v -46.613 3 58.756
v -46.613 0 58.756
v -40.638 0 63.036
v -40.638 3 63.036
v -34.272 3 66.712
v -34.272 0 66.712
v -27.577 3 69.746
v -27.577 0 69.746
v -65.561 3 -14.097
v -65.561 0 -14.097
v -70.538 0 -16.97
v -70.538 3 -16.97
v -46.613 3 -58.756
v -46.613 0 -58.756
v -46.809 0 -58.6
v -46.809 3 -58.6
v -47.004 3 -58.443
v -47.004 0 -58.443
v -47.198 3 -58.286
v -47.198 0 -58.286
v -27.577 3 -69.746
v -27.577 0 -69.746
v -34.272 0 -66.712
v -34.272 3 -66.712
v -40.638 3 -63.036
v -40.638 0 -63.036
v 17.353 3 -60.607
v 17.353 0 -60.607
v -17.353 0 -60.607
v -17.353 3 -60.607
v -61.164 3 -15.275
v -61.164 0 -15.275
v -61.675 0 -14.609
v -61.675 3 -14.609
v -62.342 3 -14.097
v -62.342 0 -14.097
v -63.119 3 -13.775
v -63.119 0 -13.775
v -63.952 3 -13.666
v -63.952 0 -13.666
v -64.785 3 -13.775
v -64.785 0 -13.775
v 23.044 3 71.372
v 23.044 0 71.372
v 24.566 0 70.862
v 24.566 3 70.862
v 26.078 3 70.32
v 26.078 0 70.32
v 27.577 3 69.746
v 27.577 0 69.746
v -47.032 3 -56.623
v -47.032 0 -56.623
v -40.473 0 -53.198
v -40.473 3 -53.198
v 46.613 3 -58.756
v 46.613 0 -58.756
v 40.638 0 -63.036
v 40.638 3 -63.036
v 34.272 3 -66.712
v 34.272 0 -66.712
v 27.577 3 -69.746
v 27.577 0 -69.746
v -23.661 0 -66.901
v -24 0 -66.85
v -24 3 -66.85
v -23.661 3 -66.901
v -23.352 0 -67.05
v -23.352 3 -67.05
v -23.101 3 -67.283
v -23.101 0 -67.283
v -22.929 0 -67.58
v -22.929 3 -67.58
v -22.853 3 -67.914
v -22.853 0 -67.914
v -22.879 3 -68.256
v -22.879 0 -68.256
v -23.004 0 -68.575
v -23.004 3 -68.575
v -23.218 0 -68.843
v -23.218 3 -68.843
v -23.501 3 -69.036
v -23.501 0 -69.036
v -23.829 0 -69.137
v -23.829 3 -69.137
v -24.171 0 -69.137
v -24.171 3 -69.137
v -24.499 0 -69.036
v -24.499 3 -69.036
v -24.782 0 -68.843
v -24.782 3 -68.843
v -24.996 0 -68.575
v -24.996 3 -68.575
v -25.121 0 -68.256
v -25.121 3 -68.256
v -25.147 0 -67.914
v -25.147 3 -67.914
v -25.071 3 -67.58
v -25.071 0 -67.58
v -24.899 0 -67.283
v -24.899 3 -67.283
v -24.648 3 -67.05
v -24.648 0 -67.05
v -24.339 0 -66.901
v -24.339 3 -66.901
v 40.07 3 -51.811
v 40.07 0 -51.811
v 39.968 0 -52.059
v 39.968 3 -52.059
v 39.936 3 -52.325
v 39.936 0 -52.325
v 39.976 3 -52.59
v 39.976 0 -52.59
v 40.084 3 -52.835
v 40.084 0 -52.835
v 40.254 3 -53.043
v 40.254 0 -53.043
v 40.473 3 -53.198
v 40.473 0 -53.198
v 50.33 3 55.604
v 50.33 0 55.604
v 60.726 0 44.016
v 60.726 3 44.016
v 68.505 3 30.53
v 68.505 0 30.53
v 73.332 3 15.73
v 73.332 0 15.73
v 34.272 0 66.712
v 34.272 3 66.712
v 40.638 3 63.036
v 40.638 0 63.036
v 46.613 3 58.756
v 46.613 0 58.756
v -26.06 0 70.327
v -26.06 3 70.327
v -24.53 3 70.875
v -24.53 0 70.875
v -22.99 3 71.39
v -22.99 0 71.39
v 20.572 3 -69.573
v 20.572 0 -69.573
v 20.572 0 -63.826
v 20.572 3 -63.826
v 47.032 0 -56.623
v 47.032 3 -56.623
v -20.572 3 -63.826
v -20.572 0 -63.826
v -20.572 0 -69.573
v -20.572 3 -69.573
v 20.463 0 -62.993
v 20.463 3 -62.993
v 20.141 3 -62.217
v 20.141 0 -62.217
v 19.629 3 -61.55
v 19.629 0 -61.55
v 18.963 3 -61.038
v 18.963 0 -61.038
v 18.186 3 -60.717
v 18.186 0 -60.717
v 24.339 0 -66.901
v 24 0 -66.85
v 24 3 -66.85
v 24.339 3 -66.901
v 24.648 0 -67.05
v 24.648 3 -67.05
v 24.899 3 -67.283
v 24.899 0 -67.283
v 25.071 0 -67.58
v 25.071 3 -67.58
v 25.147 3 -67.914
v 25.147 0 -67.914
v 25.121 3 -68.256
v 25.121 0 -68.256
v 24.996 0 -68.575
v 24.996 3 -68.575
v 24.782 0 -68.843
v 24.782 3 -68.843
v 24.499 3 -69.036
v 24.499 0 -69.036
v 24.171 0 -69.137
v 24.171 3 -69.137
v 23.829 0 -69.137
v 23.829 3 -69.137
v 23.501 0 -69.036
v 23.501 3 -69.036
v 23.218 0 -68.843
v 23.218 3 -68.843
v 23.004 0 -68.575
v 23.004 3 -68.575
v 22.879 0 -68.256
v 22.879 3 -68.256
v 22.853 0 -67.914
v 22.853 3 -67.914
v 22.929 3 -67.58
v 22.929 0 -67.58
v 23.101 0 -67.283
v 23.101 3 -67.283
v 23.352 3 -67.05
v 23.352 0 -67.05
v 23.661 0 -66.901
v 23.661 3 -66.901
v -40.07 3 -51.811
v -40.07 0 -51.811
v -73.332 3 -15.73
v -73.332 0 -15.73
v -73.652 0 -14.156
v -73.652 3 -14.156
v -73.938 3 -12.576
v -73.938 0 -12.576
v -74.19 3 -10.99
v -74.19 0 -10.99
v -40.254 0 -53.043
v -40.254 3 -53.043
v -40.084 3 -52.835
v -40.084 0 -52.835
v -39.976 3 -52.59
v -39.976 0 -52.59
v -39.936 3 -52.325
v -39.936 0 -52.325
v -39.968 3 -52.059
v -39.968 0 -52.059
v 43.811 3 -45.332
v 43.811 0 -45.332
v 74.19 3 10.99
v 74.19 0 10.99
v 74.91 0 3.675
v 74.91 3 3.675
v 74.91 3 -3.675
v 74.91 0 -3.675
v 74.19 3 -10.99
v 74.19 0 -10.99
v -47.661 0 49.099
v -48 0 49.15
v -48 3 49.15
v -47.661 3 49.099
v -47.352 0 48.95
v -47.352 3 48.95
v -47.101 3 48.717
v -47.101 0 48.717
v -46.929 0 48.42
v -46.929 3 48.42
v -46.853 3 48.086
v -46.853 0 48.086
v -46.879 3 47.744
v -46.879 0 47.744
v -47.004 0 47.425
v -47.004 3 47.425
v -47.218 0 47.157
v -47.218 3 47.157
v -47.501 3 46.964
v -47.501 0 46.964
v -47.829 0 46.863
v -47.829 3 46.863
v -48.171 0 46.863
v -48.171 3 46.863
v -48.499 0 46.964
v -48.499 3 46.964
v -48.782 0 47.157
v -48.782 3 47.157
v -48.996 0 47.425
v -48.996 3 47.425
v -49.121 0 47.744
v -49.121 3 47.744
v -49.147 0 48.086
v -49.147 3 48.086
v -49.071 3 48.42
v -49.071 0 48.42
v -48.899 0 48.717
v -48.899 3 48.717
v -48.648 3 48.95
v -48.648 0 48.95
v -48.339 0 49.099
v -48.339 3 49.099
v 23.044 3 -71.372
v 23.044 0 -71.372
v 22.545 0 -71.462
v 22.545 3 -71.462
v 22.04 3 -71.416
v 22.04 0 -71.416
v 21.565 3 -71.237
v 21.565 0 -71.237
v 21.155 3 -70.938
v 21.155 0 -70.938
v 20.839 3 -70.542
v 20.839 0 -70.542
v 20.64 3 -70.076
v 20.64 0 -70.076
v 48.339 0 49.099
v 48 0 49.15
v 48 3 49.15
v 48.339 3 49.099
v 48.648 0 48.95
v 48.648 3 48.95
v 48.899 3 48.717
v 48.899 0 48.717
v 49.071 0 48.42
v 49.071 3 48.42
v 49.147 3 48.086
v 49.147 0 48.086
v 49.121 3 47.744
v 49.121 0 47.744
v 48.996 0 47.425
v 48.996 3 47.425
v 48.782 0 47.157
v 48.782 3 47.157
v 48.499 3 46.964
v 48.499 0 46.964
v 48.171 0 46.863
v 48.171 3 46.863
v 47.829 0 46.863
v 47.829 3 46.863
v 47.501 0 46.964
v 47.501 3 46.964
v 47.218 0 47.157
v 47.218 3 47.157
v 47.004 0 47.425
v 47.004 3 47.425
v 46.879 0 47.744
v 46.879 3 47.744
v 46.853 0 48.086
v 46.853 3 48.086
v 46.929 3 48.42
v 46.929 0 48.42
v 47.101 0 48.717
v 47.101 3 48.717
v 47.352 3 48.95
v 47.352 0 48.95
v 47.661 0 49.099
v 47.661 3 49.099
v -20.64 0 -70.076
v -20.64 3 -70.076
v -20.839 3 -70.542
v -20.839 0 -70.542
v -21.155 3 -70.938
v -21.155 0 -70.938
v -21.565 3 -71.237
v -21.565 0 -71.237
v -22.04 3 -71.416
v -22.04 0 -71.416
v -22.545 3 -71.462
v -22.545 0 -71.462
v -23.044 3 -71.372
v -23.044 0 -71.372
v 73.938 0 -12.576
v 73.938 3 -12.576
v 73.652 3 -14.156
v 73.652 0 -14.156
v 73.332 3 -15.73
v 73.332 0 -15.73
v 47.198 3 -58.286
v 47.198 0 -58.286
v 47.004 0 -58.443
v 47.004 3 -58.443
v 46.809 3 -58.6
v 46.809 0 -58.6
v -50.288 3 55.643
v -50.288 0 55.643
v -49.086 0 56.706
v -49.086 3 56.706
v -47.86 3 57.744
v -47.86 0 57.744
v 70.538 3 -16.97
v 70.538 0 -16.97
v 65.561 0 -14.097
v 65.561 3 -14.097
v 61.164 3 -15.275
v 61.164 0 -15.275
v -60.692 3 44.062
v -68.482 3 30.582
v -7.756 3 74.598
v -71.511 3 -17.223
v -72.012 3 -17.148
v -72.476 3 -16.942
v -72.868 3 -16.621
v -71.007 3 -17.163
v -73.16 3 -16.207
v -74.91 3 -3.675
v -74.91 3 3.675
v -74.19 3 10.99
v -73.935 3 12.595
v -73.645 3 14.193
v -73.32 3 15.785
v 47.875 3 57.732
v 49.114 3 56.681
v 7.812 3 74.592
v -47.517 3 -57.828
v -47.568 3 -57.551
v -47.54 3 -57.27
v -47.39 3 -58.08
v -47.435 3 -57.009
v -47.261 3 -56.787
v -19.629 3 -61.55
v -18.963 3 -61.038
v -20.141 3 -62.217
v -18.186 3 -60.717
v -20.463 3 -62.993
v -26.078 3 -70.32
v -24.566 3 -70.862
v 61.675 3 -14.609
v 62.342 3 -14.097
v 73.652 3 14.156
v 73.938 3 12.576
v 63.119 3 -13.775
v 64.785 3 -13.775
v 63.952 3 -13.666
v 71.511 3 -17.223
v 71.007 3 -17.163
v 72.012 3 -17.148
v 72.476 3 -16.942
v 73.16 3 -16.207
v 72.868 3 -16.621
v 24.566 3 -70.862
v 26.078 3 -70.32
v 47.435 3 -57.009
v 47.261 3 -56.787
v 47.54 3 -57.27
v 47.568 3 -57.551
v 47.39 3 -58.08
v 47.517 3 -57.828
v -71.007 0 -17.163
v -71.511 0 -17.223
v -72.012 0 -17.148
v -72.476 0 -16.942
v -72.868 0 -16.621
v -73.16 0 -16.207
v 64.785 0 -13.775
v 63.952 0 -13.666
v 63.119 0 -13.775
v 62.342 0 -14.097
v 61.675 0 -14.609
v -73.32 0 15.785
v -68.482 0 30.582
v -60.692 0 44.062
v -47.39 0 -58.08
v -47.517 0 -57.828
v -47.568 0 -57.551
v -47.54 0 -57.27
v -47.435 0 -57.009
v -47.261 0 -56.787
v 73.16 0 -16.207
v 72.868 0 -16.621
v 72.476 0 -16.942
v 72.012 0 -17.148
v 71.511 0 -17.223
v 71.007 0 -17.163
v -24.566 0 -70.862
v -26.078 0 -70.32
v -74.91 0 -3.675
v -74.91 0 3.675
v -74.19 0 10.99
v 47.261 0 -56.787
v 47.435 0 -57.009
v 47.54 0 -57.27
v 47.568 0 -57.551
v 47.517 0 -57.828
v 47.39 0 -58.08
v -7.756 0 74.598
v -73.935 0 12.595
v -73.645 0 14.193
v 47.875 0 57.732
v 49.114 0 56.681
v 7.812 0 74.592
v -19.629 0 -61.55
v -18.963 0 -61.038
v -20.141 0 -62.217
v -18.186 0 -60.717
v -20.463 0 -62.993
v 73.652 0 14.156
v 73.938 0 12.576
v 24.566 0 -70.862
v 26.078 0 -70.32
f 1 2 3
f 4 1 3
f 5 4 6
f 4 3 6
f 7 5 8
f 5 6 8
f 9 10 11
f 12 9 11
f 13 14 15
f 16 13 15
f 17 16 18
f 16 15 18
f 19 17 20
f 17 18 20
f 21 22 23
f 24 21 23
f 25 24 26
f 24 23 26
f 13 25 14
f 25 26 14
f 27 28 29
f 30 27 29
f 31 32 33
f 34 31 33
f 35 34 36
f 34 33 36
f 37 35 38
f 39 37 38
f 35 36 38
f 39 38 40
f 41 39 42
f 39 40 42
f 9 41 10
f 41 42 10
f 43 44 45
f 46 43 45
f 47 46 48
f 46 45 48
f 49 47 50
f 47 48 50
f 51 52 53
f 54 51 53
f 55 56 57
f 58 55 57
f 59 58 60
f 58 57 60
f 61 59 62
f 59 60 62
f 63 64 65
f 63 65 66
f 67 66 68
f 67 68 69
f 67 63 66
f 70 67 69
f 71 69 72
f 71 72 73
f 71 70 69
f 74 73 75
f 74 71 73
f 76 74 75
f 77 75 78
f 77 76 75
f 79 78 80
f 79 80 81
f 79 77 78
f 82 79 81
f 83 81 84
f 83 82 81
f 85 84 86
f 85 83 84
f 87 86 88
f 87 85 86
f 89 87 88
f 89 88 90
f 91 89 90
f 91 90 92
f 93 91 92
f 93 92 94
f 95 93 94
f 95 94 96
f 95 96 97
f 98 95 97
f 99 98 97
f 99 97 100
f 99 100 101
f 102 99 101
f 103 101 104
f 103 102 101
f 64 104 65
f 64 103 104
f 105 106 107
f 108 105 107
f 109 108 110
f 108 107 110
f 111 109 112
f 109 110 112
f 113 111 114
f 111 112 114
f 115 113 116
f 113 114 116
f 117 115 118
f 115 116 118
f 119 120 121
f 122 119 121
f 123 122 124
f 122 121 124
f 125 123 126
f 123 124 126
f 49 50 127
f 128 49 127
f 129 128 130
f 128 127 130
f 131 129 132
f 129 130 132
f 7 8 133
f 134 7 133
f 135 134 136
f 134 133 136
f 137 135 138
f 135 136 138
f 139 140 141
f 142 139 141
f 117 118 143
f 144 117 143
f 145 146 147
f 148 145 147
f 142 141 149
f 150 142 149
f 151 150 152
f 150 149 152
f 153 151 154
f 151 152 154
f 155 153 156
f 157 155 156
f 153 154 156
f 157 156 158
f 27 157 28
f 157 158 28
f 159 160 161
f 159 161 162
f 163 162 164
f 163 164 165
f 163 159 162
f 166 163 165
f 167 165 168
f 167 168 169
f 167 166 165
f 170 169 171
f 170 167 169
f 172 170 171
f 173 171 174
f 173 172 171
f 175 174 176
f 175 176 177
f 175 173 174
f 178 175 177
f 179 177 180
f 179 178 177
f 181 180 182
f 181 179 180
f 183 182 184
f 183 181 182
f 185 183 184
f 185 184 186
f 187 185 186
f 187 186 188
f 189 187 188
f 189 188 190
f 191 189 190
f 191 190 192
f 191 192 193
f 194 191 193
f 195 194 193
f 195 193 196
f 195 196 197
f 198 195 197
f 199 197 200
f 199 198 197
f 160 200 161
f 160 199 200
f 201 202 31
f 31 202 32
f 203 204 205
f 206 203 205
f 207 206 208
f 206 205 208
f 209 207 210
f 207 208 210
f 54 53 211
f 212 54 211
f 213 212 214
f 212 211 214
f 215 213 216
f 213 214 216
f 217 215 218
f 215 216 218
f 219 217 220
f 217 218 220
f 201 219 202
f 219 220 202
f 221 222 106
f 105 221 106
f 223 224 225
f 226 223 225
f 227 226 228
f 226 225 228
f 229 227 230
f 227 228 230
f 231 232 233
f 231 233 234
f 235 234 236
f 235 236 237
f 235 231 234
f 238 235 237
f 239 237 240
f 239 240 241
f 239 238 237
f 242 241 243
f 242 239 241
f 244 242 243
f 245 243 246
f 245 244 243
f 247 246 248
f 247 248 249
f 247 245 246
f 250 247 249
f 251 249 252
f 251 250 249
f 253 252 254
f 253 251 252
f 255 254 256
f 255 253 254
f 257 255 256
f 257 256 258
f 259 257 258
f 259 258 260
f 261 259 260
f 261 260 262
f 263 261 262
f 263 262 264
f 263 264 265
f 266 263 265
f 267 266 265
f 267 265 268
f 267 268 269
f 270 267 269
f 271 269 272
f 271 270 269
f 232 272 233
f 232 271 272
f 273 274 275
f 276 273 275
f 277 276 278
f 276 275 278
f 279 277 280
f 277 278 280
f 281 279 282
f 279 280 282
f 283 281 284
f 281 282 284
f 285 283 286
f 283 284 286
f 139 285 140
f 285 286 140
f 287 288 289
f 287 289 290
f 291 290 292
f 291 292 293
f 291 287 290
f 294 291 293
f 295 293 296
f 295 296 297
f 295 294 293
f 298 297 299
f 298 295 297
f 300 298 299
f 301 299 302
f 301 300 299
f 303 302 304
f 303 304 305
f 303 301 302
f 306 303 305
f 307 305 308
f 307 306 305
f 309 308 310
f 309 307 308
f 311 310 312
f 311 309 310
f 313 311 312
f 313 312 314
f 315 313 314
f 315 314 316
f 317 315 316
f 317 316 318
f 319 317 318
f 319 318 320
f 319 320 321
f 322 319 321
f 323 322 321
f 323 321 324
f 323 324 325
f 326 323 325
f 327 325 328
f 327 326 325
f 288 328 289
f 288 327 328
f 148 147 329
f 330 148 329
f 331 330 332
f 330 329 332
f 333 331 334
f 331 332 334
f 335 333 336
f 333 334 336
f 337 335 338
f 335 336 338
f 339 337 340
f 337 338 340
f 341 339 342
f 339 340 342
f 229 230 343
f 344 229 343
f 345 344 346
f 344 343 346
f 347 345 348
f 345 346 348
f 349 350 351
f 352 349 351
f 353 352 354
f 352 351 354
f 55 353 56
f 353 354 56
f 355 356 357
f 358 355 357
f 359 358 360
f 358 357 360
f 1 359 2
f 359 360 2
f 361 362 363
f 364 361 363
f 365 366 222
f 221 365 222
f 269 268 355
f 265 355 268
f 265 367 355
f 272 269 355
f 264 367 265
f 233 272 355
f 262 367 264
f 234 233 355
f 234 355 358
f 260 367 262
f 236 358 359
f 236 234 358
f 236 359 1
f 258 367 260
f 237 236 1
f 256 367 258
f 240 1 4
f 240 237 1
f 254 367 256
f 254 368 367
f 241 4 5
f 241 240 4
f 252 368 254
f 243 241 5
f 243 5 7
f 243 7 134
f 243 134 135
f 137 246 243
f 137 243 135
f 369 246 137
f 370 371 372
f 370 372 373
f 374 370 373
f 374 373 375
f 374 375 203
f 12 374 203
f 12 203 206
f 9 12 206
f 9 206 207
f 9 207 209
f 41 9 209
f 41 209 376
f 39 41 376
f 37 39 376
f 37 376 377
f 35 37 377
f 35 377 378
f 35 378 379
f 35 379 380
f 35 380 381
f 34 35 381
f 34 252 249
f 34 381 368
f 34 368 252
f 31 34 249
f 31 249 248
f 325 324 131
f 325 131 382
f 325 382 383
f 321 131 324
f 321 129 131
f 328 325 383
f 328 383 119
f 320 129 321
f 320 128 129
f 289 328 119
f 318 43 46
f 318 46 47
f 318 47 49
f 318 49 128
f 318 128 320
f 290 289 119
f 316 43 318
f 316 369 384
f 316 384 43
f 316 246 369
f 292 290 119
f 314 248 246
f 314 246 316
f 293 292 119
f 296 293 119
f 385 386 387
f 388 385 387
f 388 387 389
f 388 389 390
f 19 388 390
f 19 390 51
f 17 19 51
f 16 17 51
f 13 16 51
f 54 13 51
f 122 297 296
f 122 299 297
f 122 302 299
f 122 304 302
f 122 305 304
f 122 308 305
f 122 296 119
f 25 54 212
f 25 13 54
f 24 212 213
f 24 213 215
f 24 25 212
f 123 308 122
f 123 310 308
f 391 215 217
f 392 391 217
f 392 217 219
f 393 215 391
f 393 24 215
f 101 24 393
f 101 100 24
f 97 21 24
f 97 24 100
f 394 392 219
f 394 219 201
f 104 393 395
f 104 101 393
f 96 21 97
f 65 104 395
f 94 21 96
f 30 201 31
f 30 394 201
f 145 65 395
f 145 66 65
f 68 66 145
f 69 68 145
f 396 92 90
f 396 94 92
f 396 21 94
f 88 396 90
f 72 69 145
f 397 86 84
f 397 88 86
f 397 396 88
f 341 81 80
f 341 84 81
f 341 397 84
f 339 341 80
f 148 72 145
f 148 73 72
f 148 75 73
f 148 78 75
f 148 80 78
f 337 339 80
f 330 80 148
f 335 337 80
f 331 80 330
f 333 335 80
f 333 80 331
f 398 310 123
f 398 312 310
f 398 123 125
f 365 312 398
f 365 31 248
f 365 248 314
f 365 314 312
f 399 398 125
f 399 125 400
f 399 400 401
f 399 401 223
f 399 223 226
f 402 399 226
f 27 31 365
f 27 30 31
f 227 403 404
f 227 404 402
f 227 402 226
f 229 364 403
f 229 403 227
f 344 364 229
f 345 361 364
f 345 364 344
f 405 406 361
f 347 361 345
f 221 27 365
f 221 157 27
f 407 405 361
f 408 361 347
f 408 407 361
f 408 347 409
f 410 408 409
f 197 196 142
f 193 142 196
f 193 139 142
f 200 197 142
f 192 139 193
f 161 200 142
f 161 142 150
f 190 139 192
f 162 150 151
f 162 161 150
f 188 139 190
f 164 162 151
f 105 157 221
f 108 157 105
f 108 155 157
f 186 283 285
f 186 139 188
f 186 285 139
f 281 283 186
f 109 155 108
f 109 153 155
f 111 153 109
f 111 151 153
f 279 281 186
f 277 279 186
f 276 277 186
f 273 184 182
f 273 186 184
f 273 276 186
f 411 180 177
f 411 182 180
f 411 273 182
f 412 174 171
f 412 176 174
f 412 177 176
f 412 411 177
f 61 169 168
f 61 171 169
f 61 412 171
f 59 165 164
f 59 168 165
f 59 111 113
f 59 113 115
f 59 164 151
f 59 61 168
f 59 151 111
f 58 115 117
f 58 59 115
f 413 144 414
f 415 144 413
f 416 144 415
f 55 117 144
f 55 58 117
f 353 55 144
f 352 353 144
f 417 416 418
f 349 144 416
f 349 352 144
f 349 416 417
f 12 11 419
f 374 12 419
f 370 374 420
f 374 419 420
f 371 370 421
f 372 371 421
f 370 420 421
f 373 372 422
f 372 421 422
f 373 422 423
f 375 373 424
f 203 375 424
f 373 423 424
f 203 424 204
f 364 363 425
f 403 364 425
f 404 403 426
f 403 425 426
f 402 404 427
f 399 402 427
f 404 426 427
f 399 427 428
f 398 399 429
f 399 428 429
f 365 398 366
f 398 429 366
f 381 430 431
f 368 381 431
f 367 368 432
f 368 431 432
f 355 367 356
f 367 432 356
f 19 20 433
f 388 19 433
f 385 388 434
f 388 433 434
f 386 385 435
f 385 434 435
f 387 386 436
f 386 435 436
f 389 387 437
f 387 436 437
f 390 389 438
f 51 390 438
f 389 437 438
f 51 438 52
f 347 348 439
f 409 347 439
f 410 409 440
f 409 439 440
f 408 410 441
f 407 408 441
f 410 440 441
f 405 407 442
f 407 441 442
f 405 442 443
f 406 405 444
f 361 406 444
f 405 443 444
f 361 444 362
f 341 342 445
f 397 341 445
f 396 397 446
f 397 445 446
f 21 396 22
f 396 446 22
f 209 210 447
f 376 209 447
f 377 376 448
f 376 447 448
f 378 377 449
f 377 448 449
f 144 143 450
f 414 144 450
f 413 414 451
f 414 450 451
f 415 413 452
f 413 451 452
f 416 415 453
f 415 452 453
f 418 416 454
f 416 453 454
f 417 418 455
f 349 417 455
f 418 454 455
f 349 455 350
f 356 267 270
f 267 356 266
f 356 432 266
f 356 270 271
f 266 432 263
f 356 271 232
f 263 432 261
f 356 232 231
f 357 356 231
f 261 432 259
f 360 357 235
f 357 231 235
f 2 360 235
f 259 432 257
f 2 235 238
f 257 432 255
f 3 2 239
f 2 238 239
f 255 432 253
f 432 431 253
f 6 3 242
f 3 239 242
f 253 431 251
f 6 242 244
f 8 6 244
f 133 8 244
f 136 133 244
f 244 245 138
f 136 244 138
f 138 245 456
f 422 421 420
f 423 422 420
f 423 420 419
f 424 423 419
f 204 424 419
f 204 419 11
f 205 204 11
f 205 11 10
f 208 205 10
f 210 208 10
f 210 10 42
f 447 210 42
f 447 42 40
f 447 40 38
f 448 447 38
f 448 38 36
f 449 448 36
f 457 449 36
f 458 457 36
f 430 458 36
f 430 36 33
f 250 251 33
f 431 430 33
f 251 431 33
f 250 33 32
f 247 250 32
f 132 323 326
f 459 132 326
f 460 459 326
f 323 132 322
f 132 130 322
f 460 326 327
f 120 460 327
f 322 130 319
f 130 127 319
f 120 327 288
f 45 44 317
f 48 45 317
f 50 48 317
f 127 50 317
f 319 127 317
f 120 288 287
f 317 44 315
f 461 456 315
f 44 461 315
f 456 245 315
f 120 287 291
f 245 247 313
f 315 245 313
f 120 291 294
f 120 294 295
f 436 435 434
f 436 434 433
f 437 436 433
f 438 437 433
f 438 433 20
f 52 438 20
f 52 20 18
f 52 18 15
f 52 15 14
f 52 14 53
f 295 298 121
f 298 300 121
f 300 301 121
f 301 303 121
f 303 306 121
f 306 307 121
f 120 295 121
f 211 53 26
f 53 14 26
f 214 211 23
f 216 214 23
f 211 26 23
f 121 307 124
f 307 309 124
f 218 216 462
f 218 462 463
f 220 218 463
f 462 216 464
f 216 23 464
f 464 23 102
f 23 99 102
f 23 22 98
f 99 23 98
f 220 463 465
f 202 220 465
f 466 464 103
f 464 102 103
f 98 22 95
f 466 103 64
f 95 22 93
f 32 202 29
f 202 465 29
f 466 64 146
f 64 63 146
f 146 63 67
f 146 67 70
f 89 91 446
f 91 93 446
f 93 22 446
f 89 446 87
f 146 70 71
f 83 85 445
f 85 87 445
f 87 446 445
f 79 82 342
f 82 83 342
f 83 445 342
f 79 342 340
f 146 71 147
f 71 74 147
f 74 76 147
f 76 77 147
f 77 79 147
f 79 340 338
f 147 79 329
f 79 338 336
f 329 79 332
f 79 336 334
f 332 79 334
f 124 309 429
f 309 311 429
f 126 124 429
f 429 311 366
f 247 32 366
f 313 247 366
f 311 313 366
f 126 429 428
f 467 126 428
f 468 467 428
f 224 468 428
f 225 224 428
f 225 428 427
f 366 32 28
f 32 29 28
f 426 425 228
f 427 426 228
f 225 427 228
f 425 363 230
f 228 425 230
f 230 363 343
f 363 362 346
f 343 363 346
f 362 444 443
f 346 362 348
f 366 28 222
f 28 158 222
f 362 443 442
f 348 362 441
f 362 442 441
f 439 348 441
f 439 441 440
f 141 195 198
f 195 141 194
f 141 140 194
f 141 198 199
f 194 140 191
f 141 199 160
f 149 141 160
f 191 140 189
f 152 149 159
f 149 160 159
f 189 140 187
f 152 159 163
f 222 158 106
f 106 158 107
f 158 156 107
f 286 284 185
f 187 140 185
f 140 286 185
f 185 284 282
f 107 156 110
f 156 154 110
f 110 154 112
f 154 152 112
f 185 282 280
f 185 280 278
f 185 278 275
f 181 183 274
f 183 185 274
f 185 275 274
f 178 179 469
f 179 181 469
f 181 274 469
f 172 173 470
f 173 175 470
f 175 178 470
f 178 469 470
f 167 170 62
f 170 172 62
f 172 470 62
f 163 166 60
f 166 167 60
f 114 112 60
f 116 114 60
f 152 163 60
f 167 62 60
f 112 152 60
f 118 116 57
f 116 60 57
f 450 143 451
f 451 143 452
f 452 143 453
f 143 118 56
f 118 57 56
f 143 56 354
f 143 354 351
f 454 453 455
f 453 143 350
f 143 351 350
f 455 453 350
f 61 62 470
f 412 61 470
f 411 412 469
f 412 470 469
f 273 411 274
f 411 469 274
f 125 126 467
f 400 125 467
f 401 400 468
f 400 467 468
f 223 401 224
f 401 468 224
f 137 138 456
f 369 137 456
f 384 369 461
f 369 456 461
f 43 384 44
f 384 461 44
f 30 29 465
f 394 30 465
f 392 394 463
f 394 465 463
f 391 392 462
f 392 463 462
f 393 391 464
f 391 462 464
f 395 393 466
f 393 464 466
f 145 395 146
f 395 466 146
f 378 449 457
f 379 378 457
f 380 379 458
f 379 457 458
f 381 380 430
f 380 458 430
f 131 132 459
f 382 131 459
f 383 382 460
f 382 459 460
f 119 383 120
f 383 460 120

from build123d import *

# Parameters (mm, degrees)
SKETCH1_R           = 1.15
BOSS_EXTRUDE2_DEPTH = 3


with BuildPart() as part:
    # Sketch1 → Boss-Extrude2 (new body)
    with BuildSketch(Plane(origin=(0, 0, 0), x_dir=(1, 0, 0), z_dir=(0, 1, 0))):
        with BuildLine():
            Line((17.353017405, 60.60705136), (-17.353017405, 60.60705136))
            ThreePointArc((-17.353017405, 60.60705136), (-19.629383429, 61.54995304), (-20.572285109, 63.826319064))
            Line((-20.572285109, 63.826319064), (-20.572285109, 69.573042322))
            ThreePointArc((-20.572285109, 69.573042322), (-21.350187318, 71.101515686), (-23.043737047, 71.372166724))
            ThreePointArc((-23.043737047, 71.372166724), (-25.323501925, 70.595469049), (-27.577152814, 69.745972233))
            ThreePointArc((-27.577152814, 69.745972233), (-37.5, 64.951905284), (-46.613207358, 58.755501017))
            ThreePointArc((-46.613207358, 58.755501017), (-46.906411899, 58.521692754), (-47.198443695, 58.286421342))
            ThreePointArc((-47.198443695, 58.286421342), (-47.564165172, 57.409734041), (-47.032034758, 56.622860452))
            Line((-47.032034758, 56.622860452), (-40.472942236, 53.197546407))
            ThreePointArc((-40.472942236, 53.197546407), (-39.975613978, 52.590341474), (-40.069820478, 51.811137802))
            Line((-40.069820478, 51.811137802), (-61.163754829, 15.275371775))
            ThreePointArc((-61.163754829, 15.275371775), (-63.118514649, 13.77543181), (-65.561356294, 14.097038013))
            Line((-65.561356294, 14.097038013), (-70.538164624, 16.970399642))
            ThreePointArc((-70.538164624, 16.970399642), (-72.250812491, 17.06095325), (-73.33197803, 15.729621681))
            ThreePointArc((-73.33197803, 15.729621681), (-73.799220551, 13.366938545), (-74.190360172, 10.990471215))
            ThreePointArc((-74.190360172, 10.990471215), (-75, 0), (-74.190360172, -10.990471215))
            ThreePointArc((-74.190360172, -10.990471215), (-73.794140163, -13.394957173), (-73.320012655, -15.785301525))
            ThreePointArc((-73.320012655, -15.785301525), (-64.937662855, -37.524657799), (-50.288240982, -55.642545043))
            ThreePointArc((-50.288240982, -55.642545043), (-48.475718626, -57.228530504), (-46.613207358, -58.755501017))
            ThreePointArc((-46.613207358, -58.755501017), (-37.5, -64.951905284), (-27.577152814, -69.745972233))
            ThreePointArc((-27.577152814, -69.745972233), (-25.296696887, -70.605078618), (-22.989534201, -71.389644328))
            ThreePointArc((-22.989534201, -71.389644328), (0.028475495, -74.999994594), (23.043737047, -71.372166724))
            ThreePointArc((23.043737047, -71.372166724), (25.323501925, -70.595469049), (27.577152814, -69.745972233))
            ThreePointArc((27.577152814, -69.745972233), (37.5, -64.951905284), (46.613207358, -58.755501017))
            ThreePointArc((46.613207358, -58.755501017), (48.497443275, -57.210121445), (50.330478454, -55.604342803))
            ThreePointArc((50.330478454, -55.604342803), (64.96613835, -37.475336795), (73.33197803, -15.729621681))
            ThreePointArc((73.33197803, -15.729621681), (73.799220551, -13.366938545), (74.190360172, -10.990471215))
            ThreePointArc((74.190360172, -10.990471215), (75, 0), (74.190360172, 10.990471215))
            ThreePointArc((74.190360172, 10.990471215), (73.799220551, 13.366938545), (73.33197803, 15.729621681))
            ThreePointArc((73.33197803, 15.729621681), (72.250812491, 17.06095325), (70.538164624, 16.970399642))
            Line((70.538164624, 16.970399642), (65.561356294, 14.097038013))
            ThreePointArc((65.561356294, 14.097038013), (63.118514649, 13.77543181), (61.163754829, 15.275371775))
            Line((61.163754829, 15.275371775), (43.810737424, 45.331679586))
            Line((43.810737424, 45.331679586), (40.069820478, 51.811137802))
            ThreePointArc((40.069820478, 51.811137802), (39.975613978, 52.590341474), (40.472942236, 53.197546407))
            Line((40.472942236, 53.197546407), (47.032034758, 56.622860452))
            ThreePointArc((47.032034758, 56.622860452), (47.564165172, 57.409734041), (47.198443695, 58.286421342))
            ThreePointArc((47.198443695, 58.286421342), (46.906411899, 58.521692754), (46.613207358, 58.755501017))
            ThreePointArc((46.613207358, 58.755501017), (37.5, 64.951905284), (27.577152814, 69.745972233))
            ThreePointArc((27.577152814, 69.745972233), (25.323501925, 70.595469049), (23.043737047, 71.372166724))
            ThreePointArc((23.043737047, 71.372166724), (21.350187318, 71.101515686), (20.572285109, 69.573042322))
            Line((20.572285109, 69.573042322), (20.572285109, 63.826319064))
            ThreePointArc((20.572285109, 63.826319064), (19.629383429, 61.54995304), (17.353017405, 60.60705136))
        make_face()
        with Locations(Location((-48, -48, 0), (0, 0, 270))):
            Circle(SKETCH1_R, mode=Mode.SUBTRACT)
        with Locations(Location((48, -48, 0), (0, 0, 270))):
            Circle(SKETCH1_R, mode=Mode.SUBTRACT)
        with Locations(Location((-24, 68, 0), (0, 0, 270))):
            Circle(SKETCH1_R, mode=Mode.SUBTRACT)
        with Locations(Location((24, 68, 0), (0, 0, 270))):
            Circle(SKETCH1_R, mode=Mode.SUBTRACT)
    extrude(amount=BOSS_EXTRUDE2_DEPTH)


solid = part.part
